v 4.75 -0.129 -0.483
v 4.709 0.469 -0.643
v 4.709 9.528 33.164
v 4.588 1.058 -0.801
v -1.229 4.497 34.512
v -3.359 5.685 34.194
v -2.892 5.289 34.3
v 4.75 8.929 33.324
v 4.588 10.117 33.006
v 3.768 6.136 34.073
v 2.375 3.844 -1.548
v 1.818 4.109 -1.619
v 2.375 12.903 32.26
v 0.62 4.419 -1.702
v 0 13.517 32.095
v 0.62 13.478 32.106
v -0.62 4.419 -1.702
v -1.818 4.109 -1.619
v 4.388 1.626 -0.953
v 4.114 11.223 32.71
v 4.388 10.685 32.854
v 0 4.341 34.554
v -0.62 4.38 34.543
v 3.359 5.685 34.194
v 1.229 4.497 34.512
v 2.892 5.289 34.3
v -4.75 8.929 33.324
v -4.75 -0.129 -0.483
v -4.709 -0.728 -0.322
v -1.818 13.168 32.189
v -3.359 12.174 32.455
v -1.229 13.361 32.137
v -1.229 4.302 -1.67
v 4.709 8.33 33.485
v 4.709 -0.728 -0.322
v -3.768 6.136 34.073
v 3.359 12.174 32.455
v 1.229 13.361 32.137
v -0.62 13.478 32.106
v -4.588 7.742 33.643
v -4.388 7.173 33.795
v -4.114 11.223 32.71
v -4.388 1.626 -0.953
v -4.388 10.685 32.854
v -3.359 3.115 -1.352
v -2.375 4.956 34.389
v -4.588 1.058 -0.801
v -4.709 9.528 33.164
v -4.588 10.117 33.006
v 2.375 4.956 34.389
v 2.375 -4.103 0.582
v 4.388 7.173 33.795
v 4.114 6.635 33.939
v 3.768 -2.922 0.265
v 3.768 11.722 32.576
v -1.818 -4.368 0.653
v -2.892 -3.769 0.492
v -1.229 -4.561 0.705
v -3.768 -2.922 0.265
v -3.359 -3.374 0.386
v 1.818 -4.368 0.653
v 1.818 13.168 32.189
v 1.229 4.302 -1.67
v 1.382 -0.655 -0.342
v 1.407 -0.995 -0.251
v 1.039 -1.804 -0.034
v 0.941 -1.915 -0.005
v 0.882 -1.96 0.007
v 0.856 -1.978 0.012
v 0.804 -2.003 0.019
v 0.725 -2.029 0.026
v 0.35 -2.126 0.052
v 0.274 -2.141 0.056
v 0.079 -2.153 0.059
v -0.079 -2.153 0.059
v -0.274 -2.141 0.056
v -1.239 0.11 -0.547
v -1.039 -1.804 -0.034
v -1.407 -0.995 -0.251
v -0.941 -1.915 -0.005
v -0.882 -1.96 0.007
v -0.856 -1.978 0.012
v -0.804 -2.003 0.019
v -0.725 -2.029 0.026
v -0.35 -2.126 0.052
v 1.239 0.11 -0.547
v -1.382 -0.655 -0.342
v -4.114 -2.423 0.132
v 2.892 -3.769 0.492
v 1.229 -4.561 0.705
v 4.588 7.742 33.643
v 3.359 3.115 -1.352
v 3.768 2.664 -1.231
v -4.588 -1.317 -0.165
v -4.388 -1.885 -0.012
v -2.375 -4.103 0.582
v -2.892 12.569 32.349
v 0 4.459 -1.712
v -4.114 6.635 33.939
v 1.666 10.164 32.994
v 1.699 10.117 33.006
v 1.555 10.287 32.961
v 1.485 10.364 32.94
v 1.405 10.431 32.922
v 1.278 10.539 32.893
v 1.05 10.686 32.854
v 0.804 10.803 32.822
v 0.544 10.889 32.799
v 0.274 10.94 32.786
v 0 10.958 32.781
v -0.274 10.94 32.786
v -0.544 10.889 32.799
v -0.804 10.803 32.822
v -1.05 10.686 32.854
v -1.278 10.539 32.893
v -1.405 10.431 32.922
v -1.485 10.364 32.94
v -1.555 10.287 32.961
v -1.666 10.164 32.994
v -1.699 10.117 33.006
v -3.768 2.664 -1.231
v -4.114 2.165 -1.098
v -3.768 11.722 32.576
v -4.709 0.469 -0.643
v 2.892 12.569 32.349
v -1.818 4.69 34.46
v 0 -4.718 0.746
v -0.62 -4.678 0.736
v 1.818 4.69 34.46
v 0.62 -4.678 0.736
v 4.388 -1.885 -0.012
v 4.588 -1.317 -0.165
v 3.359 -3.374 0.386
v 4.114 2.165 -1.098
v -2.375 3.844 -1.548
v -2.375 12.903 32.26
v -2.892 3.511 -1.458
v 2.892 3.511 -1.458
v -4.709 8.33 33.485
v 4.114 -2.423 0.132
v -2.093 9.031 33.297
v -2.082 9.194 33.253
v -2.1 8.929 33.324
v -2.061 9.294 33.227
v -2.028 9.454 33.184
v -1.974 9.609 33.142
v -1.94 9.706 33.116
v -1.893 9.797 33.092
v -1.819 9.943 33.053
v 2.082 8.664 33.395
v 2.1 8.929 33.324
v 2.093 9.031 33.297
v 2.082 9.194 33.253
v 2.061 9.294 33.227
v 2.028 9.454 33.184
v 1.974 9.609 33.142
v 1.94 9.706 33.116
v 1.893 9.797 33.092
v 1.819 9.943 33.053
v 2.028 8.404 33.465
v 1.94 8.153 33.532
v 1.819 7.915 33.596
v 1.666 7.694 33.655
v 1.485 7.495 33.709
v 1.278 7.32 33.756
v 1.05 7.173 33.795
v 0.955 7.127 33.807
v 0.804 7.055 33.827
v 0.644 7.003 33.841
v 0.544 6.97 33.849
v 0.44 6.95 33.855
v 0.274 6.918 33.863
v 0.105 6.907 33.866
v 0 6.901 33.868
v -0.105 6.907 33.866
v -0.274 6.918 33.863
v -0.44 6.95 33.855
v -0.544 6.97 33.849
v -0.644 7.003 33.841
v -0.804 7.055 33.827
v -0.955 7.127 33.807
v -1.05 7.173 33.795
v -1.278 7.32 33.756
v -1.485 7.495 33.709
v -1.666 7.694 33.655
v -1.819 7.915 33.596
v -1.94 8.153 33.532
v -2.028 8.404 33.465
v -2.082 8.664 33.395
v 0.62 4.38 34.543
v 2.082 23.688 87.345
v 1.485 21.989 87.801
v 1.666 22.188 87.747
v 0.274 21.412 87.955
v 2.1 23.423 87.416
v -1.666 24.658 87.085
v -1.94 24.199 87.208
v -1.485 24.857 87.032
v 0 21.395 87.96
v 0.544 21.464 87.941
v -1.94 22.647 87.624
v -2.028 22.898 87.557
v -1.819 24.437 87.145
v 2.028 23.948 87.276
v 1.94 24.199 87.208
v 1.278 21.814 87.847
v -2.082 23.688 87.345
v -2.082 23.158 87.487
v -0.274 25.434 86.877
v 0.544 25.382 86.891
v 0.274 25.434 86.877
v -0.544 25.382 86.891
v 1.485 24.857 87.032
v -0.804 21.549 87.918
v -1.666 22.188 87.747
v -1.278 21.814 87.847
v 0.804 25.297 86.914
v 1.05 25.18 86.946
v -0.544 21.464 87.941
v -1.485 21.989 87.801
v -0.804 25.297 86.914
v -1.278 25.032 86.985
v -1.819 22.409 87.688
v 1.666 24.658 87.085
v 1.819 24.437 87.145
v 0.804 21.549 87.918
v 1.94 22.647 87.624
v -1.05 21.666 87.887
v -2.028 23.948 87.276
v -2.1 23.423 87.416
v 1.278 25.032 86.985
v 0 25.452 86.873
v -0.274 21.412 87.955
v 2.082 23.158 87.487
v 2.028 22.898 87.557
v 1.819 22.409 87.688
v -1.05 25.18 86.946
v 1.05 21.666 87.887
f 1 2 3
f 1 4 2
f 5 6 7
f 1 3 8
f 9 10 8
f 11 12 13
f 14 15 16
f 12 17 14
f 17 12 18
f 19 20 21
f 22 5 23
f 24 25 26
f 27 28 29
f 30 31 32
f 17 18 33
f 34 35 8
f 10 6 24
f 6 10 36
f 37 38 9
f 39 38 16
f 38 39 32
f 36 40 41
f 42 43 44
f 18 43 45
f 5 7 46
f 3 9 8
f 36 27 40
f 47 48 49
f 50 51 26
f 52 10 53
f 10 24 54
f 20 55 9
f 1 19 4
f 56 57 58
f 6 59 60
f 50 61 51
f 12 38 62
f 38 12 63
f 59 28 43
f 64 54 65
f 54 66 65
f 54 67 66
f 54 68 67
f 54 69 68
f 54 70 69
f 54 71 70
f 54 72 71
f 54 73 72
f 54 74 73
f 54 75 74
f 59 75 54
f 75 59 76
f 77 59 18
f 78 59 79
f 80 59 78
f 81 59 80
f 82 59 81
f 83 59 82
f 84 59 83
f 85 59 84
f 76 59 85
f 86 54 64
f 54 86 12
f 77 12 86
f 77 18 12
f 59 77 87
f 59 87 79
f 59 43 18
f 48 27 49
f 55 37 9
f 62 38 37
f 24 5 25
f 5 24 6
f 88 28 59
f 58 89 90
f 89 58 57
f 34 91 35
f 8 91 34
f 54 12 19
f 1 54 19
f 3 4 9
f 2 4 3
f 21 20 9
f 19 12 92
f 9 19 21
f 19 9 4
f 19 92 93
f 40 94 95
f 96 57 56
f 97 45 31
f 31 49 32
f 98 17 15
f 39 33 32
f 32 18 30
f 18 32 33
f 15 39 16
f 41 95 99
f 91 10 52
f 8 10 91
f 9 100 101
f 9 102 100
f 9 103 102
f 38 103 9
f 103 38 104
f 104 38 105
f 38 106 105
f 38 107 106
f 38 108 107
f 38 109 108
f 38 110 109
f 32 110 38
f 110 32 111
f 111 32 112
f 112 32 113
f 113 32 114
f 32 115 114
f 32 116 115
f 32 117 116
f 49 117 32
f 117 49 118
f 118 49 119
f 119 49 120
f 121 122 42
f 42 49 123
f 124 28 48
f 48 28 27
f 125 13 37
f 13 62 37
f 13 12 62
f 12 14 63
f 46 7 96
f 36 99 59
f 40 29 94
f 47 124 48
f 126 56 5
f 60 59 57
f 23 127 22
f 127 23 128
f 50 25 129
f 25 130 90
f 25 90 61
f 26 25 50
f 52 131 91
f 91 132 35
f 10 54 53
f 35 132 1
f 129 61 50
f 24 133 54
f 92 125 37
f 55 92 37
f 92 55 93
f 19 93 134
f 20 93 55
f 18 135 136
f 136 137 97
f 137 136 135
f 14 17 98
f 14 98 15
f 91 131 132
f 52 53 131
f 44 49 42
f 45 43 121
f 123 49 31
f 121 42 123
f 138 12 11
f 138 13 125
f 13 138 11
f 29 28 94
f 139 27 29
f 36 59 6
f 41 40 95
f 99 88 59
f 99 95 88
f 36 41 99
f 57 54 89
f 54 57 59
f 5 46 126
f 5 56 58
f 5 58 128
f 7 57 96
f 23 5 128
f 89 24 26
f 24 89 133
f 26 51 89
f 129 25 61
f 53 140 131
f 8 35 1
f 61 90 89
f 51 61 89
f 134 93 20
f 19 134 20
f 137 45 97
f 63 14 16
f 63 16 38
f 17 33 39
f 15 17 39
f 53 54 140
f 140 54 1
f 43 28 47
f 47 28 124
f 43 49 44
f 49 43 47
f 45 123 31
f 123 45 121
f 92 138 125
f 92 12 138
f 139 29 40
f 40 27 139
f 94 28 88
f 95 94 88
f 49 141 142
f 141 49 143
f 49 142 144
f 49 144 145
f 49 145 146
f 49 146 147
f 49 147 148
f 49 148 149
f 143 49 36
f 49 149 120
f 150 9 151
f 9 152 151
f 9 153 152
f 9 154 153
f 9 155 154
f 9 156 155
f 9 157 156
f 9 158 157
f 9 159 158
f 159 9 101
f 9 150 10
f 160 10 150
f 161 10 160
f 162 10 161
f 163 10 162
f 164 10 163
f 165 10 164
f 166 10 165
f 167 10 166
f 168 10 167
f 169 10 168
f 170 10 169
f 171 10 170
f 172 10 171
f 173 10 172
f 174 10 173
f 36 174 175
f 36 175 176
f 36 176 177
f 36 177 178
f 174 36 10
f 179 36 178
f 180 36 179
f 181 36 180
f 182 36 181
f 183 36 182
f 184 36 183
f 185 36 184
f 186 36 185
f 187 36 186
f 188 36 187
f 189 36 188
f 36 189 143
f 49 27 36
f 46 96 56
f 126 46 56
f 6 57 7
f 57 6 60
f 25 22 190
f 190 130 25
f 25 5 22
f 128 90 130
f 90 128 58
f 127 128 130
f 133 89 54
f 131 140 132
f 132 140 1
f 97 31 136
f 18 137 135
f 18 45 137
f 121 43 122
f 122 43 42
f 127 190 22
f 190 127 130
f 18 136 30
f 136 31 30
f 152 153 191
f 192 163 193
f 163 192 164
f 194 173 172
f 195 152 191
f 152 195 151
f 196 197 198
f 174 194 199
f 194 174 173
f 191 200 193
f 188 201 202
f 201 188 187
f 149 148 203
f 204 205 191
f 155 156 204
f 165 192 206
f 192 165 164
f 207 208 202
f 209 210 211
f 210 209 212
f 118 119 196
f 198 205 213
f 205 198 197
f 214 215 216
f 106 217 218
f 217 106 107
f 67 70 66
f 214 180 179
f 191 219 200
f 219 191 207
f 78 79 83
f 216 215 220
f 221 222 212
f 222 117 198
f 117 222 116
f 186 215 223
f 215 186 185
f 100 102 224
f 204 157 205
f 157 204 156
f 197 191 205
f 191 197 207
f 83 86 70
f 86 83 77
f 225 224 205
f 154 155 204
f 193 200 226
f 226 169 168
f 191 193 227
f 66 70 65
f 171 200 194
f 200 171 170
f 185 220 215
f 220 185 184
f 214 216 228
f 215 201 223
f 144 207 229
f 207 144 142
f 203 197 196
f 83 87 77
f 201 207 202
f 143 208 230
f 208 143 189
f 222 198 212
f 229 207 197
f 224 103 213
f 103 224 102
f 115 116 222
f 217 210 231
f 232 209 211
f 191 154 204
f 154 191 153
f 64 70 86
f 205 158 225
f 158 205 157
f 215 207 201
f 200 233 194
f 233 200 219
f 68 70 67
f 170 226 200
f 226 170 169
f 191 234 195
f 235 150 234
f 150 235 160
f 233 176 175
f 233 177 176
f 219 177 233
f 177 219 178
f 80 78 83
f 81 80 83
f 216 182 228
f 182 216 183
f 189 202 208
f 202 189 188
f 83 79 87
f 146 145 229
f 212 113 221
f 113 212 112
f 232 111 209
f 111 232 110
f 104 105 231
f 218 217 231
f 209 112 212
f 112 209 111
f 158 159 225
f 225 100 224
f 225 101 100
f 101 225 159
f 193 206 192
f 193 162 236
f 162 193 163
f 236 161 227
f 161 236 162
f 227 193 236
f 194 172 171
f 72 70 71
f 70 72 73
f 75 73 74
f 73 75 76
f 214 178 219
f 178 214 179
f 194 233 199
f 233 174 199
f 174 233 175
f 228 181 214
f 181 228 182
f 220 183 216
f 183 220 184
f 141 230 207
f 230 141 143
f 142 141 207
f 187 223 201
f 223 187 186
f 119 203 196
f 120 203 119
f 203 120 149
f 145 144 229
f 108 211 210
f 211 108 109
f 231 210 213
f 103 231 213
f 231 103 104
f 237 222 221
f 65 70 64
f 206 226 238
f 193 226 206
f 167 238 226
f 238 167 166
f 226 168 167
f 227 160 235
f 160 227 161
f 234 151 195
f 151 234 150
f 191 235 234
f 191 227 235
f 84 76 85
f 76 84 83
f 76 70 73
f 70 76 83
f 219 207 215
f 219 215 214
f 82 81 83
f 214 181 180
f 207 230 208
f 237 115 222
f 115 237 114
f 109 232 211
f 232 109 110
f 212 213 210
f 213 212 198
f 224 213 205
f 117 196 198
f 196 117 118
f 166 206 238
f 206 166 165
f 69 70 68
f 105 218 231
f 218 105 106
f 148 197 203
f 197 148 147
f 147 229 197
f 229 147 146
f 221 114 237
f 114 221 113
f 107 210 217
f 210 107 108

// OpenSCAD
// Pocket-hole geometry helpers.
// Open this file directly in OpenSCAD to inspect a standalone pocket-hole bore.

/* [Standalone preview] */
pocket_angle = 15;
pocket_diameter = 9.5;
pilot_diameter = 4.2;
pocket_length = 34;
pilot_length = 90;

function _ph_vsub(a, b) = [a[0]-b[0], a[1]-b[1], a[2]-b[2]];
function _ph_vlen(v) = sqrt(v[0]*v[0] + v[1]*v[1] + v[2]*v[2]);
function _ph_unit(v) = let(l = _ph_vlen(v)) [v[0]/l, v[1]/l, v[2]/l];

module pocket_cylinder_between(p1, p2, d, extra = 0) {
    v = _ph_vsub(p2, p1);
    l = _ph_vlen(v);
    u = _ph_unit(v);
    p = [p1[0] - u[0]*extra/2,
         p1[1] - u[1]*extra/2,
         p1[2] - u[2]*extra/2];

    translate(p)
        rotate(a = acos(u[2]), v = [-u[1], u[0], 0])
            cylinder(h = l + extra, d = d, $fn = 48);
}

module pocket_hole_bore(entry,
                        direction_target,
                        pocket_d = 9.5,
                        pilot_d = 4.2,
                        pocket_length = 34,
                        pilot_length = 90) {
    u = _ph_unit(_ph_vsub(direction_target, entry));
    pocket_end = [entry[0] + u[0]*pocket_length,
                  entry[1] + u[1]*pocket_length,
                  entry[2] + u[2]*pocket_length];
    pilot_end = [entry[0] + u[0]*pilot_length,
                 entry[1] + u[1]*pilot_length,
                 entry[2] + u[2]*pilot_length];

    pocket_cylinder_between(entry, pocket_end, pocket_d, 1.0);
    pocket_cylinder_between(entry, pilot_end, pilot_d, 1.0);
}

// Standalone preview of the subtractive bore geometry itself.
_target = [0, sin(pocket_angle) * pilot_length, cos(pocket_angle) * pilot_length];
pocket_hole_bore(
    [0,0,0],
    _target,
    pocket_diameter,
    pilot_diameter,
    pocket_length,
    pilot_length
);
